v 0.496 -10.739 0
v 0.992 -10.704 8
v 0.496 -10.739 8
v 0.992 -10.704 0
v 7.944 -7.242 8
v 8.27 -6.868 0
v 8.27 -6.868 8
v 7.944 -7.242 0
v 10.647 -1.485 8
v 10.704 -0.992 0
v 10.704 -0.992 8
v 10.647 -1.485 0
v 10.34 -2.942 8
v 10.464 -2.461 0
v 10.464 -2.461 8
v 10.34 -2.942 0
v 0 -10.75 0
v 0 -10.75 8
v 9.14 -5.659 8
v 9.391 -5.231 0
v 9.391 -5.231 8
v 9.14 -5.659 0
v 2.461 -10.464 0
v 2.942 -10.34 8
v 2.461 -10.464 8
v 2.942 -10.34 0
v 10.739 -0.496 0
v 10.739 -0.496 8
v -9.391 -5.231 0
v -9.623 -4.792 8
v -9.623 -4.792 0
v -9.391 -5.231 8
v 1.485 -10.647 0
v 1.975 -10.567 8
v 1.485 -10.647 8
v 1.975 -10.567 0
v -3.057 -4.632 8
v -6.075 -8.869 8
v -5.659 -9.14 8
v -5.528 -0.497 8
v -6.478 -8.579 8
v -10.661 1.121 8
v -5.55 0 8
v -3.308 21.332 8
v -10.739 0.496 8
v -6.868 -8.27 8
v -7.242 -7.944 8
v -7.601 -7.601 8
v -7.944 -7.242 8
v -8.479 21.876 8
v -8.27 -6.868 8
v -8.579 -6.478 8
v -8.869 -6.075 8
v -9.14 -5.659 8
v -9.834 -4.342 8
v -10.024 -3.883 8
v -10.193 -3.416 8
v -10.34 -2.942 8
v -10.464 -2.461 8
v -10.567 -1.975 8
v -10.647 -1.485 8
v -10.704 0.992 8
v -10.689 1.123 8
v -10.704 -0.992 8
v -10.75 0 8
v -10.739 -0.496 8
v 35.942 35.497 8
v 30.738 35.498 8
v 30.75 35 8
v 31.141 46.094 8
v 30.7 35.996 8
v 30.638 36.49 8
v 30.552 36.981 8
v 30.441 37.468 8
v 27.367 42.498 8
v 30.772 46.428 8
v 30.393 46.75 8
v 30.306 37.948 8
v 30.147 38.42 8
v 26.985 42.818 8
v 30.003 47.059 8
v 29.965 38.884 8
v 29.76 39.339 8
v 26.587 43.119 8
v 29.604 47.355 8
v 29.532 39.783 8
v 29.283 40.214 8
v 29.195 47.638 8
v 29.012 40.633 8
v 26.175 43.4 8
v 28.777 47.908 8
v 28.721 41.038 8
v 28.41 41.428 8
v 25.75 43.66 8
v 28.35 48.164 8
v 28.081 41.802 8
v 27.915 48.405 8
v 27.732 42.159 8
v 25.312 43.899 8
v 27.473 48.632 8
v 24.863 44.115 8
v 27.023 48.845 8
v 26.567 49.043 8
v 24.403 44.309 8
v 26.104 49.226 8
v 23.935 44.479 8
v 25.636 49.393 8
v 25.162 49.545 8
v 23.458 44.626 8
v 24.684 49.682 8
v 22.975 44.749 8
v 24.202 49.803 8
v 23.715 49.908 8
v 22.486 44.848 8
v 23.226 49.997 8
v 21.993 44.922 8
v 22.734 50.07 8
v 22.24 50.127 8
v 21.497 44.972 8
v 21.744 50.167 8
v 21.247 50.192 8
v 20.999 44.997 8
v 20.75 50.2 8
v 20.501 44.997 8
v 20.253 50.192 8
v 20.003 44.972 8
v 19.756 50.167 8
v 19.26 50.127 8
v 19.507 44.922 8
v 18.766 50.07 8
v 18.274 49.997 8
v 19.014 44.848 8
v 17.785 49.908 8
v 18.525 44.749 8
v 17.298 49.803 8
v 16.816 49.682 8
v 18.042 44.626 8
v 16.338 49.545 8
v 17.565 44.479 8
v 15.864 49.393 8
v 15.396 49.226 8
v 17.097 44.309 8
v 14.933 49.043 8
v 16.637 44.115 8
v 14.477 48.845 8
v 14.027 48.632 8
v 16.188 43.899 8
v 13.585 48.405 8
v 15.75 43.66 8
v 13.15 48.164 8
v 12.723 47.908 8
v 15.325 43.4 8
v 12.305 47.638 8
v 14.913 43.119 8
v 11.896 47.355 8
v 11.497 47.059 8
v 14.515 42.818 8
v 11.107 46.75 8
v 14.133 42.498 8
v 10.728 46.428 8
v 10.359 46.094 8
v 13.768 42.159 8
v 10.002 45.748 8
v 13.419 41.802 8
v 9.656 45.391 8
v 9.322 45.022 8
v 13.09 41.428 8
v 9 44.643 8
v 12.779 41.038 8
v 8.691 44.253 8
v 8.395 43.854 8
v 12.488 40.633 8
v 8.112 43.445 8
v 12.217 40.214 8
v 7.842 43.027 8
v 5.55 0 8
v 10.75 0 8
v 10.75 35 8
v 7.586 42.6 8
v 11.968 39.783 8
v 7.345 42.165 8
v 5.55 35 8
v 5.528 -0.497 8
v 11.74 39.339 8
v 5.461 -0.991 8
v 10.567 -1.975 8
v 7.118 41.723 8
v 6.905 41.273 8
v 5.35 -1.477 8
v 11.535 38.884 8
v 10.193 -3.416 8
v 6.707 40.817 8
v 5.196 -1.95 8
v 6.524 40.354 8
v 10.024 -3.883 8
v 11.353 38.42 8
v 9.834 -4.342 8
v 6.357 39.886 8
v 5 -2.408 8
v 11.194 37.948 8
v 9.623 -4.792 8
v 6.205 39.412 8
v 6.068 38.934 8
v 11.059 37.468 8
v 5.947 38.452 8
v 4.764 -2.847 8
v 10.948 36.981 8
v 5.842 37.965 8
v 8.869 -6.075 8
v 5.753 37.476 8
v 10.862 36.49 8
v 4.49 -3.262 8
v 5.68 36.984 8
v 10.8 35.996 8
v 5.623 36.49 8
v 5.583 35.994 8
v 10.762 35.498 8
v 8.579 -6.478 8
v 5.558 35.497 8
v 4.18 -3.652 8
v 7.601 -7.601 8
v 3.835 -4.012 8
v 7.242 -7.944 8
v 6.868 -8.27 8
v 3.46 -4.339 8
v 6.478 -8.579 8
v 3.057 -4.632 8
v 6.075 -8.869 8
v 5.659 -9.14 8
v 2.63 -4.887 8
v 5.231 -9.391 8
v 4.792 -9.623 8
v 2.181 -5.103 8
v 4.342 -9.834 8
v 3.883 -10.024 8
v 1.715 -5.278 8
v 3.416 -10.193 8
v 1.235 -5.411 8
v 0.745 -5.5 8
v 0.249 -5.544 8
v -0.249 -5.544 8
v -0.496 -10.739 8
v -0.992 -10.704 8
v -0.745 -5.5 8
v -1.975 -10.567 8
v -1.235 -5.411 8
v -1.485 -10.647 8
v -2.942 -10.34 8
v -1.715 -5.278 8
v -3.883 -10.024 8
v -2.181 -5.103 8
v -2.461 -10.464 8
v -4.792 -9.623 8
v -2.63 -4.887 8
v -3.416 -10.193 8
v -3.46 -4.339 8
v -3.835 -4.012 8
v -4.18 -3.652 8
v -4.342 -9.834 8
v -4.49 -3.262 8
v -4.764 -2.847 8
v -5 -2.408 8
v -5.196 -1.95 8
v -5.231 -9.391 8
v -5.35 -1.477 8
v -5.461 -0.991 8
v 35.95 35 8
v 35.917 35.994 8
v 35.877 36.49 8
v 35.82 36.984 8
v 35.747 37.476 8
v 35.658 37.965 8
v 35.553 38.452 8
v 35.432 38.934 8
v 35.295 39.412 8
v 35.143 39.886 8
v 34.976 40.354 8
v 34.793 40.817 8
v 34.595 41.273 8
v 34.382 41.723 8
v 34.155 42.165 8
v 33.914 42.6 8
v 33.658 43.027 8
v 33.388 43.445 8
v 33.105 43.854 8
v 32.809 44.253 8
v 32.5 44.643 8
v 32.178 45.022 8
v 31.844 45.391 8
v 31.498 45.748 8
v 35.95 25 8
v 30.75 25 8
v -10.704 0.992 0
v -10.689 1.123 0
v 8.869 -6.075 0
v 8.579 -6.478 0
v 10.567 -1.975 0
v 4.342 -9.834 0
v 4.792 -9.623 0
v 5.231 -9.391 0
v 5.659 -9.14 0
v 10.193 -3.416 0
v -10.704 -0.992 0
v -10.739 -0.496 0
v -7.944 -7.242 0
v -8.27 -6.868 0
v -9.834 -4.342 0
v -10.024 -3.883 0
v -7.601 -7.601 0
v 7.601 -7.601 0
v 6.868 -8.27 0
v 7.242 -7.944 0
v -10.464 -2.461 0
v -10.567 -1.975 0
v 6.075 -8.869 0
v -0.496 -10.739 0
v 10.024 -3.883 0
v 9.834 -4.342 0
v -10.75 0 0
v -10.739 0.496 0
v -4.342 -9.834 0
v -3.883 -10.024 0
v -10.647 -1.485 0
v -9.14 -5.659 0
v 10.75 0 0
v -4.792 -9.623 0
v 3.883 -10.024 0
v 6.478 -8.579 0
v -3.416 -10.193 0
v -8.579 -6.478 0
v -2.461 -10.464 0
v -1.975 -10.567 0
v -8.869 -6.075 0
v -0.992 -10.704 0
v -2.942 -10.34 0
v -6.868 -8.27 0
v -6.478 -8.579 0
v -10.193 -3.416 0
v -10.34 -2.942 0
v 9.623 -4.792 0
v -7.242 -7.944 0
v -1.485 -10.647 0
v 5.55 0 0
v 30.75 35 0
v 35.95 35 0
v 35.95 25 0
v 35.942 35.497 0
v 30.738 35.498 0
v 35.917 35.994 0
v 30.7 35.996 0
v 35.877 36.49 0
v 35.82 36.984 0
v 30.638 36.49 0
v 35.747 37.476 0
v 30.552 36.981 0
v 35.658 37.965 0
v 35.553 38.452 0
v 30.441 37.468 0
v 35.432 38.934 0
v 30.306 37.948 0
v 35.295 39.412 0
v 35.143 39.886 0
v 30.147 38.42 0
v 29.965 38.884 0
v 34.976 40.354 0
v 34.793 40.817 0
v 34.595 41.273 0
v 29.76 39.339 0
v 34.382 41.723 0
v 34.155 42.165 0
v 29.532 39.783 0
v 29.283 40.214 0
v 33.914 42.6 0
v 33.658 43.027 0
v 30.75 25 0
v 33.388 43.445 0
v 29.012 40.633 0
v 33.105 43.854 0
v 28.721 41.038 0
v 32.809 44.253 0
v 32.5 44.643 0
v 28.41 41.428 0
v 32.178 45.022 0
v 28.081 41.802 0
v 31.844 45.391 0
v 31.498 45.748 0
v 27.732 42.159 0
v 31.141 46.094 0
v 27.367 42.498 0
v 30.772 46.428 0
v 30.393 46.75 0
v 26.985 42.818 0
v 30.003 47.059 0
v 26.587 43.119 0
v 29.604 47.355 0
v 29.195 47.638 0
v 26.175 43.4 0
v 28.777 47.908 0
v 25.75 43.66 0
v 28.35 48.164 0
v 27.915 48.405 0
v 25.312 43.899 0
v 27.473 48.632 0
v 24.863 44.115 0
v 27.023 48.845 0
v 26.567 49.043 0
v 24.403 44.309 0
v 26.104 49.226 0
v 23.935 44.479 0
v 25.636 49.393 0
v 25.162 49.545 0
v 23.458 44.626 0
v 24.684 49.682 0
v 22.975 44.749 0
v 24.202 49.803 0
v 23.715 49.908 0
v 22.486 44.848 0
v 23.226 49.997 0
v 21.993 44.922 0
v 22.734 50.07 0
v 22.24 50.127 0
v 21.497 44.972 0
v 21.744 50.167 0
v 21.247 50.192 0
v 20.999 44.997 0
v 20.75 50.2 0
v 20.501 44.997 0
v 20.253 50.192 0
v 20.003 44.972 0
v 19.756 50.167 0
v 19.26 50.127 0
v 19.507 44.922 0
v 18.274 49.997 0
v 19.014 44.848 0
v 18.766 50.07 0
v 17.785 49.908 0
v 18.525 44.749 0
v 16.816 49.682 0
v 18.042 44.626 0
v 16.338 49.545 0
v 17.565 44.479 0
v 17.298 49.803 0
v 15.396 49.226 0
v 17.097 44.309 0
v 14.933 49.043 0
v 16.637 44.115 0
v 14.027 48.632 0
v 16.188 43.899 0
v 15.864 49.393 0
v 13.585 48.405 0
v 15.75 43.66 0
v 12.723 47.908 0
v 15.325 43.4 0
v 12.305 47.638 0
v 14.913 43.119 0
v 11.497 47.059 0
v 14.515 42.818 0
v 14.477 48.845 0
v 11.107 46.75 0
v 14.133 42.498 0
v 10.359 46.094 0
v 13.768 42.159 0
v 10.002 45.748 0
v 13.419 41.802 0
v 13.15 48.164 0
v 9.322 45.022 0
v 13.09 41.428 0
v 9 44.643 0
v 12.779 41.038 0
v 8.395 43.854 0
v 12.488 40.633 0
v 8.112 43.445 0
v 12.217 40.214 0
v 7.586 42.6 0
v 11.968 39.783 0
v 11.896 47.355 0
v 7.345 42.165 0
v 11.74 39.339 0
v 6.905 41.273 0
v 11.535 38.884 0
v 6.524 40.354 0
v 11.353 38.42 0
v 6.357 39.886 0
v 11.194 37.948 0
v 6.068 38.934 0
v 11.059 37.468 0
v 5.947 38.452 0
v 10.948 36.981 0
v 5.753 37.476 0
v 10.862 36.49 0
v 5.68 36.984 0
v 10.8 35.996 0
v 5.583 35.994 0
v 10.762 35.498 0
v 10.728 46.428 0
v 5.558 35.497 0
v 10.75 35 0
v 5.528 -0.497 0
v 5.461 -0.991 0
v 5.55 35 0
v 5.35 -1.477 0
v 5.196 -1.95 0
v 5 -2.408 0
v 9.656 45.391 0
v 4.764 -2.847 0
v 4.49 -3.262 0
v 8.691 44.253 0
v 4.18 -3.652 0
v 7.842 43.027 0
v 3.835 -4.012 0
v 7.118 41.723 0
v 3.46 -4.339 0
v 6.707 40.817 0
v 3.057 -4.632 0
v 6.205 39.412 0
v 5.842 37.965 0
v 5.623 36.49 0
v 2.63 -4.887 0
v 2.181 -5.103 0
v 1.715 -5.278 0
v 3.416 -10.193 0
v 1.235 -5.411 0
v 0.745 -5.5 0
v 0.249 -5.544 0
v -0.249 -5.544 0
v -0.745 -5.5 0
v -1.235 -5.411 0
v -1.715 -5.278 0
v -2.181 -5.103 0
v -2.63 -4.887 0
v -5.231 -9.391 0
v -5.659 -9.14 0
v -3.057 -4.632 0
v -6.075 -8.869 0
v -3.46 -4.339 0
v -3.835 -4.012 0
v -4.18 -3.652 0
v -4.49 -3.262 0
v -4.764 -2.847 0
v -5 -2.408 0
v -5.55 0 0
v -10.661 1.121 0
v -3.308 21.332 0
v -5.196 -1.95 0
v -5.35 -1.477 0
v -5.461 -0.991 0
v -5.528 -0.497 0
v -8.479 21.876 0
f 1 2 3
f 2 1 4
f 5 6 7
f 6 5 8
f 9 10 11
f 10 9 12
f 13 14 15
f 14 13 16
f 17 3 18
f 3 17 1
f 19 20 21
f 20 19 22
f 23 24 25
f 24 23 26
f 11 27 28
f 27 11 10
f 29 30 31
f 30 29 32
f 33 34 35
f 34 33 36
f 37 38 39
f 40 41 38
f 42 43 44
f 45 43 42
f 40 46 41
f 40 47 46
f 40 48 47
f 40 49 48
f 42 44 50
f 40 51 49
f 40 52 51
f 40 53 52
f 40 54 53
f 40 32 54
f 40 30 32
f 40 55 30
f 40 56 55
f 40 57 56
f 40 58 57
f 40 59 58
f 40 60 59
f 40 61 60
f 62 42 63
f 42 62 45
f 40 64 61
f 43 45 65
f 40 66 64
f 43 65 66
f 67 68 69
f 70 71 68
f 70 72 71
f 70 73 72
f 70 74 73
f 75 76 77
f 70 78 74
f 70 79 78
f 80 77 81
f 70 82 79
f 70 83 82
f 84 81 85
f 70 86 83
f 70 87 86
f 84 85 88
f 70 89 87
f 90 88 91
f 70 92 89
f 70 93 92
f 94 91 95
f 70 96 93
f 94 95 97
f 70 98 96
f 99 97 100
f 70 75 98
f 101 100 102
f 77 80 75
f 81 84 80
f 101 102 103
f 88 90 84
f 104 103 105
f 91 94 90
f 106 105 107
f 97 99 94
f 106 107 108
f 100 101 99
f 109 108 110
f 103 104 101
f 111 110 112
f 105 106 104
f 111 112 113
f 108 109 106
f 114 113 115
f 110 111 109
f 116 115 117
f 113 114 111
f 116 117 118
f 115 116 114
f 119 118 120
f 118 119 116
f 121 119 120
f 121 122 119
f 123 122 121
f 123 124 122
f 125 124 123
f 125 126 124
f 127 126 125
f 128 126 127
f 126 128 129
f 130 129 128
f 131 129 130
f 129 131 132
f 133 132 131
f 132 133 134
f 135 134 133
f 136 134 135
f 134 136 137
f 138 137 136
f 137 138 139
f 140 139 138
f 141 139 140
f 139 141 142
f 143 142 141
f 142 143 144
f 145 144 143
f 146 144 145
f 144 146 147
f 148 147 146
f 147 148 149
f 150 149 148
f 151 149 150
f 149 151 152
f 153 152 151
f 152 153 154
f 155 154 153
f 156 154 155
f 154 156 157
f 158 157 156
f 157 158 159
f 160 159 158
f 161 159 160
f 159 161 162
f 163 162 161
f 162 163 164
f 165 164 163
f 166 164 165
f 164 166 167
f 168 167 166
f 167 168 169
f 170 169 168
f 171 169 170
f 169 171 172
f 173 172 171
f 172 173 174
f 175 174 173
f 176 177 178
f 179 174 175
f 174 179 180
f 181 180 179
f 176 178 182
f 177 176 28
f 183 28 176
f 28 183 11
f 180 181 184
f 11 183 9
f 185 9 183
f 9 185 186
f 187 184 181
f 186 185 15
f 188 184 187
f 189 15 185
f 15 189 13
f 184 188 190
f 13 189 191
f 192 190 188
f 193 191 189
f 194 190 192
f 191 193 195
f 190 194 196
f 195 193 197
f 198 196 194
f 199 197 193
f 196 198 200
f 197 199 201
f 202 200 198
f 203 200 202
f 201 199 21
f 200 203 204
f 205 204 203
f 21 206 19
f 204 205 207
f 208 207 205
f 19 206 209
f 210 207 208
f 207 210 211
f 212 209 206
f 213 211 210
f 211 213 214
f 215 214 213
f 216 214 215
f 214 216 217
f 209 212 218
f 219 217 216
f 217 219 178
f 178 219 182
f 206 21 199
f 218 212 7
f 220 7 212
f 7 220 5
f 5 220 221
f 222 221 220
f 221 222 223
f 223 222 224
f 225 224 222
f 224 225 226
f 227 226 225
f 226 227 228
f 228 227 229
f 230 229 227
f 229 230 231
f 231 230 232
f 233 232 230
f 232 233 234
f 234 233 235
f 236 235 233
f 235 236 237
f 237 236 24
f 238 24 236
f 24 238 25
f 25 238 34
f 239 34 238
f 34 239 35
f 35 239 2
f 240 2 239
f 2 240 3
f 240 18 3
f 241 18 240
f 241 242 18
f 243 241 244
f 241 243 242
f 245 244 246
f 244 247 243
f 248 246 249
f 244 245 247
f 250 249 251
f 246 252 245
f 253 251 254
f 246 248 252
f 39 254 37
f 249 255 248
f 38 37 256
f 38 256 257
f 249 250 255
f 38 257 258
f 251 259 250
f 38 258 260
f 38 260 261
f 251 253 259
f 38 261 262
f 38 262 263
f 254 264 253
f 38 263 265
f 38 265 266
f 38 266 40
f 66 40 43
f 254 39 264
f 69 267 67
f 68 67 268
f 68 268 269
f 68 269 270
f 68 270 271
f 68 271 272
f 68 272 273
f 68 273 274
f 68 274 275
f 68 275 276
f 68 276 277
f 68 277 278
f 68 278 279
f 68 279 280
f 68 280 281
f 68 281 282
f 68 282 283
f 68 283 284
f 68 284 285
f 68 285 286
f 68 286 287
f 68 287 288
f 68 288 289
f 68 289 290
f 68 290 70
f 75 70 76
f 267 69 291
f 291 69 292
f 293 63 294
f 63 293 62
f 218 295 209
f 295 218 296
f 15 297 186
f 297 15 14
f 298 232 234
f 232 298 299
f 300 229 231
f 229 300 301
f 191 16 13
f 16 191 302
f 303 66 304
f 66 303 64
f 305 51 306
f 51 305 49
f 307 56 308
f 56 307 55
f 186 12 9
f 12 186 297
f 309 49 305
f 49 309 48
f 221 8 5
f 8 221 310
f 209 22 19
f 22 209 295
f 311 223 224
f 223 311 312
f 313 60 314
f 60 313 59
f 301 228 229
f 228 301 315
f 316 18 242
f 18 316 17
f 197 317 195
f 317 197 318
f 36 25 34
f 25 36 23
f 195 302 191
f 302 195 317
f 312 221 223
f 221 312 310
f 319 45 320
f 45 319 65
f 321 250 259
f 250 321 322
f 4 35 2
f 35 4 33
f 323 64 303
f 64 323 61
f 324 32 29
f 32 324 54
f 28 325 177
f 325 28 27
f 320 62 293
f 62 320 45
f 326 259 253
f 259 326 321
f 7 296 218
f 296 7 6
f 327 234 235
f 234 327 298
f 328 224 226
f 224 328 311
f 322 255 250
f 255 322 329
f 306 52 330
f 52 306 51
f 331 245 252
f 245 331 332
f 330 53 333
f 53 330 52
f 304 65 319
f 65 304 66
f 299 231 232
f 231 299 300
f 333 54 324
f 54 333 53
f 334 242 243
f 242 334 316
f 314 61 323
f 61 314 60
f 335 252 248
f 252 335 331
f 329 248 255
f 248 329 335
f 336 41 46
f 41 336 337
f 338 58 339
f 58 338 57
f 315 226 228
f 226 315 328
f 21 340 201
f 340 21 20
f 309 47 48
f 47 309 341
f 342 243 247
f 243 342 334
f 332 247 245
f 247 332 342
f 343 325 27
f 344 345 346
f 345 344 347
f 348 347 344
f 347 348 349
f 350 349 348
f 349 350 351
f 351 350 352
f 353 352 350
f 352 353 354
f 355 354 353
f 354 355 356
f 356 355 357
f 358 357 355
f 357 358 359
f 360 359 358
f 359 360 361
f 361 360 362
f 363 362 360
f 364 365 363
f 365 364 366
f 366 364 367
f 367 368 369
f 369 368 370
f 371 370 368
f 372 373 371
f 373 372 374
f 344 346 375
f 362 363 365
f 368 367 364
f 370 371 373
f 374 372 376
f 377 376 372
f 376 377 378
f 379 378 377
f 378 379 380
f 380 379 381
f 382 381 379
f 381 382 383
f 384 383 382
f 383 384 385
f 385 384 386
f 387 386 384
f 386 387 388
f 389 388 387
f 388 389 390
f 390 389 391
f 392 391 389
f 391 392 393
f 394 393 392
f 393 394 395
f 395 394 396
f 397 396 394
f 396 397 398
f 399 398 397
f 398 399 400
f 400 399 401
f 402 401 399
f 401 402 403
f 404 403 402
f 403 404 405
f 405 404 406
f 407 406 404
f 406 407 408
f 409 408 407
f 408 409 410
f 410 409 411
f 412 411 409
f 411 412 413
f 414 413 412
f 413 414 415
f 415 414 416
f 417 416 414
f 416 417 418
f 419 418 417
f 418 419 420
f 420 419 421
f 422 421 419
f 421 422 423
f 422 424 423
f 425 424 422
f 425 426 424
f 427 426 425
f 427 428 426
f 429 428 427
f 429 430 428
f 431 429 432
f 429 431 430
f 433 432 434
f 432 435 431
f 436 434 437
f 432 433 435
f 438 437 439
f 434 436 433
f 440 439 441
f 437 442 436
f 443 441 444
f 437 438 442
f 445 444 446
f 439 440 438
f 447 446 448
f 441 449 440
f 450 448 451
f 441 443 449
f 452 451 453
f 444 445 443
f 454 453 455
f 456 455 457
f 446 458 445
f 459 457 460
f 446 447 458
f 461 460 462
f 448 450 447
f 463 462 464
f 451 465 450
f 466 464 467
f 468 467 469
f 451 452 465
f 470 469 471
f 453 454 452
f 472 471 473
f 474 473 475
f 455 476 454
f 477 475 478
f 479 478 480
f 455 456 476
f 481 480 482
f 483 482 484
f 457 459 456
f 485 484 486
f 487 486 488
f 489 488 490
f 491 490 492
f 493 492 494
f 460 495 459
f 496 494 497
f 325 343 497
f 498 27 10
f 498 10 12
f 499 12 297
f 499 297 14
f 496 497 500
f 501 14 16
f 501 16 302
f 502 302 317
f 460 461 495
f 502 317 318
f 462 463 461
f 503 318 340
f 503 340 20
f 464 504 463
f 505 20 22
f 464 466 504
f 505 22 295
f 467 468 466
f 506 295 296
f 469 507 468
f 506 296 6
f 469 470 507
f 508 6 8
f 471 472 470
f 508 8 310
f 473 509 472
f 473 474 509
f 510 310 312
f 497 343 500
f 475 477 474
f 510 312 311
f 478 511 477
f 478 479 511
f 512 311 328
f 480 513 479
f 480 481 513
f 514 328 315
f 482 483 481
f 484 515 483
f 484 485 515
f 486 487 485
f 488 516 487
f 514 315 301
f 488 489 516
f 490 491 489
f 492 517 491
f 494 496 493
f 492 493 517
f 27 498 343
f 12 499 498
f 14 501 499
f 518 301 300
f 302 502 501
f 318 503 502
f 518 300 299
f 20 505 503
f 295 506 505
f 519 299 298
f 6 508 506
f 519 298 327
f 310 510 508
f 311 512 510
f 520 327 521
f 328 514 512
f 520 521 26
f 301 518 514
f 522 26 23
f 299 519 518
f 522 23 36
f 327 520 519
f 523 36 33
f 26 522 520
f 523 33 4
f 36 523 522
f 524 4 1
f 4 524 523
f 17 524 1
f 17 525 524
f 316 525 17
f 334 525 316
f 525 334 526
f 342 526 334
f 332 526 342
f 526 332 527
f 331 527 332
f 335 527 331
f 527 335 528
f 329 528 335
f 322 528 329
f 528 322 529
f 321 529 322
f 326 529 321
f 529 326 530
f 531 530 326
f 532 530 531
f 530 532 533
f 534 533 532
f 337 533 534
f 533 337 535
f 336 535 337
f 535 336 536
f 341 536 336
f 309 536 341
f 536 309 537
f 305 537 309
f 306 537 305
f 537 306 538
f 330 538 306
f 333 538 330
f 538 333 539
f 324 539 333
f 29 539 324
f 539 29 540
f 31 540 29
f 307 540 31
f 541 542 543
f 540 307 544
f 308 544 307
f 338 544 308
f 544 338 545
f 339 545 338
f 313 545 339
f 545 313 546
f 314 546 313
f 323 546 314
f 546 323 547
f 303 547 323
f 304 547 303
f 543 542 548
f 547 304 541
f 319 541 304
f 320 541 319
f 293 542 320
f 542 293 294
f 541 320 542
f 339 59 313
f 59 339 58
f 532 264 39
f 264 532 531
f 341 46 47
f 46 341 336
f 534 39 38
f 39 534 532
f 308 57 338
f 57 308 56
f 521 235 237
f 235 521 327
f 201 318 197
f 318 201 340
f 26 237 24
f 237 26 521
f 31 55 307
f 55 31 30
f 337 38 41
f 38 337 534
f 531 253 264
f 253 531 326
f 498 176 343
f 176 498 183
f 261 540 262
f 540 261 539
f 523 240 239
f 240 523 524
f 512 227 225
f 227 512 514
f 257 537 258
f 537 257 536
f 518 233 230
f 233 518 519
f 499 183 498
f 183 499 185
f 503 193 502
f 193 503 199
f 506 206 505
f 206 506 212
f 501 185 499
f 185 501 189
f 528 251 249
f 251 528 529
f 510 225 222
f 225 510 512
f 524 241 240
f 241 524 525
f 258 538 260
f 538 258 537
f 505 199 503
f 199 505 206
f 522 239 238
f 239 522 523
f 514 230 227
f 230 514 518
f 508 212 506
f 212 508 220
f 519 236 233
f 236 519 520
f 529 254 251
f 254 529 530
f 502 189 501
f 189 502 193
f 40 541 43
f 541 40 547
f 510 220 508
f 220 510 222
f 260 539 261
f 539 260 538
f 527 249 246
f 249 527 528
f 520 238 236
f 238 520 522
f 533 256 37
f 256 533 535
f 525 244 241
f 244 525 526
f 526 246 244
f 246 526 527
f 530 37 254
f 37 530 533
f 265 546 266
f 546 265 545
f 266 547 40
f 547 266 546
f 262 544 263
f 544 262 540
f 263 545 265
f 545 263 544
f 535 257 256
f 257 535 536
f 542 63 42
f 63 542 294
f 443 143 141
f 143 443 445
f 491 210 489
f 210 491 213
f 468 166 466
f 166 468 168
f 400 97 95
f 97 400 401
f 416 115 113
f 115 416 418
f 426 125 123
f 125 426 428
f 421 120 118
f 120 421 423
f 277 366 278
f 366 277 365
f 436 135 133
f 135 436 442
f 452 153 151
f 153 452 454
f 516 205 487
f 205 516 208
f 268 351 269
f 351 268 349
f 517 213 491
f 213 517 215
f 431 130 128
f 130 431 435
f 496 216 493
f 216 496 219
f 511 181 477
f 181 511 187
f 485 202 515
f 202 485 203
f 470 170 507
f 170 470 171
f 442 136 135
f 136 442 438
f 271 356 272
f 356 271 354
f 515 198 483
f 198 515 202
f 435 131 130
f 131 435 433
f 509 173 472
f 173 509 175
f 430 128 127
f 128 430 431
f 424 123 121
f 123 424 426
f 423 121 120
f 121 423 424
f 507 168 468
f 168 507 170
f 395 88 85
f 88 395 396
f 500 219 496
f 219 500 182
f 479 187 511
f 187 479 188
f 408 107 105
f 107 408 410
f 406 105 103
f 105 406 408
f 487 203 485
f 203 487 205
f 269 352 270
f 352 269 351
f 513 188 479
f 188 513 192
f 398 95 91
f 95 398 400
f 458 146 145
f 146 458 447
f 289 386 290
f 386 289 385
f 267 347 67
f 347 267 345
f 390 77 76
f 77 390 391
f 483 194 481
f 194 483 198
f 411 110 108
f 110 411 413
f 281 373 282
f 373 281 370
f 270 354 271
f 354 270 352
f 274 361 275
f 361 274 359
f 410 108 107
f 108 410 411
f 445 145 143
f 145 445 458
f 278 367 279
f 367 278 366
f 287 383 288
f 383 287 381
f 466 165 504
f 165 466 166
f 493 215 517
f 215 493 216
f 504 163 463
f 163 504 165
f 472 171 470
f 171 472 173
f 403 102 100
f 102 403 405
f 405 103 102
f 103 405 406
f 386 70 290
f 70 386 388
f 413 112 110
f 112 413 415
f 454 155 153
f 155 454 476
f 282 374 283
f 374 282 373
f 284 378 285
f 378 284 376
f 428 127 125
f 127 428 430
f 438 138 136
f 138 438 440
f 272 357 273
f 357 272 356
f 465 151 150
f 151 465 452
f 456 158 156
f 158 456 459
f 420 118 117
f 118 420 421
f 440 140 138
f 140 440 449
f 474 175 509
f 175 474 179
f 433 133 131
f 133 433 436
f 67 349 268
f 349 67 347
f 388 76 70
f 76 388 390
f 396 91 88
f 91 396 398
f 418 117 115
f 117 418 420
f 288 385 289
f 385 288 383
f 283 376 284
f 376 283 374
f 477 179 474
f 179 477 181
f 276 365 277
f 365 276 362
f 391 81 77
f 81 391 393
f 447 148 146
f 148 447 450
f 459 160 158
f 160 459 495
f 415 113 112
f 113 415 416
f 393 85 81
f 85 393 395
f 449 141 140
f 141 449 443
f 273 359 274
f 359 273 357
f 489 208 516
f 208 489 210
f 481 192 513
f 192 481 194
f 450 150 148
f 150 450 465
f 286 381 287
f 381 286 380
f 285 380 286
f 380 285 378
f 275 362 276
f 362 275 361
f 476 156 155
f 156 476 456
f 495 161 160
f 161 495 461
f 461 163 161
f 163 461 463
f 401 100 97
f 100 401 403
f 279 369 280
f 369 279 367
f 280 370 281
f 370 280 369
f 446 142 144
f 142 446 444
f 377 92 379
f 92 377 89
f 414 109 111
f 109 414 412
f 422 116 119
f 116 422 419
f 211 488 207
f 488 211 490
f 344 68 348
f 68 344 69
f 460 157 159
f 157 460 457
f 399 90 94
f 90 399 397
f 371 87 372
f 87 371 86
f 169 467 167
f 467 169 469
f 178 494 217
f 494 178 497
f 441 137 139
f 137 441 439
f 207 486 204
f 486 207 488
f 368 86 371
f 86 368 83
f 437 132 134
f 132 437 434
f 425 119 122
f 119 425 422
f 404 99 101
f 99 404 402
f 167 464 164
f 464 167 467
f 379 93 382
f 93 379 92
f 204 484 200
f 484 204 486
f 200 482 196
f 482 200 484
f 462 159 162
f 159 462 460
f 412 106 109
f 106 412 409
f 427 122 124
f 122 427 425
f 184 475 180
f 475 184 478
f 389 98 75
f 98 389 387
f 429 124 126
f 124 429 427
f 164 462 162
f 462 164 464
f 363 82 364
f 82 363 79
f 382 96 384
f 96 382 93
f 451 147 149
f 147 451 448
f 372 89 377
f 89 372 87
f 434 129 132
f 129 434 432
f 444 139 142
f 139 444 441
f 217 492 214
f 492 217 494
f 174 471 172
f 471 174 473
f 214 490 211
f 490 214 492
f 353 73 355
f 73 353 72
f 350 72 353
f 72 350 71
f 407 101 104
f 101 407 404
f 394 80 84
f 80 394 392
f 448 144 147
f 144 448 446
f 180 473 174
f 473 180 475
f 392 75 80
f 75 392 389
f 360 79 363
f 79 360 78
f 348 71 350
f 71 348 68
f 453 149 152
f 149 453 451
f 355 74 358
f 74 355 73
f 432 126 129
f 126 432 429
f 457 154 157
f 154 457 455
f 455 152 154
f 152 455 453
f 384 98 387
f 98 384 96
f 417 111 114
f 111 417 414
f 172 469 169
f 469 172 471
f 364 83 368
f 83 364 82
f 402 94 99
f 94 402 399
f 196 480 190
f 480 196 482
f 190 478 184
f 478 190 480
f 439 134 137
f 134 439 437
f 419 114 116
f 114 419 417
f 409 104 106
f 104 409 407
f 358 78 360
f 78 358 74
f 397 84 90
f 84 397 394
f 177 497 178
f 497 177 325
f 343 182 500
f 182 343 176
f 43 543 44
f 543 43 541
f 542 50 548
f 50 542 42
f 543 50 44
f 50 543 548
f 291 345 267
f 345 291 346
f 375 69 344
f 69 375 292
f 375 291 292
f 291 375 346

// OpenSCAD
$fa=0.5; // default minimum facet angle
$fs=0.5; // default minimum facet size

width = 8;

support_d = 11.1;
support_extension = 14;
thickness = 5.2;

support_angle = 6;
support_bump_distance_from_edge = 27;
support_bump_size = 0;
support_bump_distance = support_bump_distance_from_edge - support_d / 2 + support_bump_size;
support_height = support_bump_distance + support_bump_size;

hook_d = 20;
hook_extension = 10;
height = 35;

difference() {
    cylinder(d = support_d + thickness * 2, h = width);
    translate([0, 0, -1]) cylinder(d=support_d, h=width+2);
    translate([0, 0, -1]) cube([support_d + 2, support_d + thickness * 2 + 2, width + 2]);
    rotate([0, 0, -support_angle]) translate([-support_d - 2, 0, -1]) cube([support_d + 2, support_d + thickness * 2 + 2, width + 2]);
}

translate([support_d/2, 0, 0]) cube([thickness, height, width]);

translate([-support_d/2, 0, 0]) 
rotate([0, 0, -support_angle])
union() {
    translate([-thickness, 0, 0]) cube([thickness, support_height, width]);
    translate([0, support_bump_distance, 0]) rotate([0, 0, 0]) cylinder(r=support_bump_size, h=width);
}

translate([hook_d /2 + thickness + support_d/2, height, 0])
rotate([0, 0, 180])
difference() {
    cylinder(d = hook_d + thickness * 2, h = width);
    translate([0, 0, -1]) cylinder(d=hook_d, h=width+2);
    translate([-hook_d /2 - thickness - 1, 0, -1]) cube([hook_d + thickness * 2 + 2, hook_d + thickness * 2 + 2, width + 2]);
}

translate([hook_d + thickness + support_d / 2, height - hook_extension, 0]) cube([thickness, hook_extension, width]);
